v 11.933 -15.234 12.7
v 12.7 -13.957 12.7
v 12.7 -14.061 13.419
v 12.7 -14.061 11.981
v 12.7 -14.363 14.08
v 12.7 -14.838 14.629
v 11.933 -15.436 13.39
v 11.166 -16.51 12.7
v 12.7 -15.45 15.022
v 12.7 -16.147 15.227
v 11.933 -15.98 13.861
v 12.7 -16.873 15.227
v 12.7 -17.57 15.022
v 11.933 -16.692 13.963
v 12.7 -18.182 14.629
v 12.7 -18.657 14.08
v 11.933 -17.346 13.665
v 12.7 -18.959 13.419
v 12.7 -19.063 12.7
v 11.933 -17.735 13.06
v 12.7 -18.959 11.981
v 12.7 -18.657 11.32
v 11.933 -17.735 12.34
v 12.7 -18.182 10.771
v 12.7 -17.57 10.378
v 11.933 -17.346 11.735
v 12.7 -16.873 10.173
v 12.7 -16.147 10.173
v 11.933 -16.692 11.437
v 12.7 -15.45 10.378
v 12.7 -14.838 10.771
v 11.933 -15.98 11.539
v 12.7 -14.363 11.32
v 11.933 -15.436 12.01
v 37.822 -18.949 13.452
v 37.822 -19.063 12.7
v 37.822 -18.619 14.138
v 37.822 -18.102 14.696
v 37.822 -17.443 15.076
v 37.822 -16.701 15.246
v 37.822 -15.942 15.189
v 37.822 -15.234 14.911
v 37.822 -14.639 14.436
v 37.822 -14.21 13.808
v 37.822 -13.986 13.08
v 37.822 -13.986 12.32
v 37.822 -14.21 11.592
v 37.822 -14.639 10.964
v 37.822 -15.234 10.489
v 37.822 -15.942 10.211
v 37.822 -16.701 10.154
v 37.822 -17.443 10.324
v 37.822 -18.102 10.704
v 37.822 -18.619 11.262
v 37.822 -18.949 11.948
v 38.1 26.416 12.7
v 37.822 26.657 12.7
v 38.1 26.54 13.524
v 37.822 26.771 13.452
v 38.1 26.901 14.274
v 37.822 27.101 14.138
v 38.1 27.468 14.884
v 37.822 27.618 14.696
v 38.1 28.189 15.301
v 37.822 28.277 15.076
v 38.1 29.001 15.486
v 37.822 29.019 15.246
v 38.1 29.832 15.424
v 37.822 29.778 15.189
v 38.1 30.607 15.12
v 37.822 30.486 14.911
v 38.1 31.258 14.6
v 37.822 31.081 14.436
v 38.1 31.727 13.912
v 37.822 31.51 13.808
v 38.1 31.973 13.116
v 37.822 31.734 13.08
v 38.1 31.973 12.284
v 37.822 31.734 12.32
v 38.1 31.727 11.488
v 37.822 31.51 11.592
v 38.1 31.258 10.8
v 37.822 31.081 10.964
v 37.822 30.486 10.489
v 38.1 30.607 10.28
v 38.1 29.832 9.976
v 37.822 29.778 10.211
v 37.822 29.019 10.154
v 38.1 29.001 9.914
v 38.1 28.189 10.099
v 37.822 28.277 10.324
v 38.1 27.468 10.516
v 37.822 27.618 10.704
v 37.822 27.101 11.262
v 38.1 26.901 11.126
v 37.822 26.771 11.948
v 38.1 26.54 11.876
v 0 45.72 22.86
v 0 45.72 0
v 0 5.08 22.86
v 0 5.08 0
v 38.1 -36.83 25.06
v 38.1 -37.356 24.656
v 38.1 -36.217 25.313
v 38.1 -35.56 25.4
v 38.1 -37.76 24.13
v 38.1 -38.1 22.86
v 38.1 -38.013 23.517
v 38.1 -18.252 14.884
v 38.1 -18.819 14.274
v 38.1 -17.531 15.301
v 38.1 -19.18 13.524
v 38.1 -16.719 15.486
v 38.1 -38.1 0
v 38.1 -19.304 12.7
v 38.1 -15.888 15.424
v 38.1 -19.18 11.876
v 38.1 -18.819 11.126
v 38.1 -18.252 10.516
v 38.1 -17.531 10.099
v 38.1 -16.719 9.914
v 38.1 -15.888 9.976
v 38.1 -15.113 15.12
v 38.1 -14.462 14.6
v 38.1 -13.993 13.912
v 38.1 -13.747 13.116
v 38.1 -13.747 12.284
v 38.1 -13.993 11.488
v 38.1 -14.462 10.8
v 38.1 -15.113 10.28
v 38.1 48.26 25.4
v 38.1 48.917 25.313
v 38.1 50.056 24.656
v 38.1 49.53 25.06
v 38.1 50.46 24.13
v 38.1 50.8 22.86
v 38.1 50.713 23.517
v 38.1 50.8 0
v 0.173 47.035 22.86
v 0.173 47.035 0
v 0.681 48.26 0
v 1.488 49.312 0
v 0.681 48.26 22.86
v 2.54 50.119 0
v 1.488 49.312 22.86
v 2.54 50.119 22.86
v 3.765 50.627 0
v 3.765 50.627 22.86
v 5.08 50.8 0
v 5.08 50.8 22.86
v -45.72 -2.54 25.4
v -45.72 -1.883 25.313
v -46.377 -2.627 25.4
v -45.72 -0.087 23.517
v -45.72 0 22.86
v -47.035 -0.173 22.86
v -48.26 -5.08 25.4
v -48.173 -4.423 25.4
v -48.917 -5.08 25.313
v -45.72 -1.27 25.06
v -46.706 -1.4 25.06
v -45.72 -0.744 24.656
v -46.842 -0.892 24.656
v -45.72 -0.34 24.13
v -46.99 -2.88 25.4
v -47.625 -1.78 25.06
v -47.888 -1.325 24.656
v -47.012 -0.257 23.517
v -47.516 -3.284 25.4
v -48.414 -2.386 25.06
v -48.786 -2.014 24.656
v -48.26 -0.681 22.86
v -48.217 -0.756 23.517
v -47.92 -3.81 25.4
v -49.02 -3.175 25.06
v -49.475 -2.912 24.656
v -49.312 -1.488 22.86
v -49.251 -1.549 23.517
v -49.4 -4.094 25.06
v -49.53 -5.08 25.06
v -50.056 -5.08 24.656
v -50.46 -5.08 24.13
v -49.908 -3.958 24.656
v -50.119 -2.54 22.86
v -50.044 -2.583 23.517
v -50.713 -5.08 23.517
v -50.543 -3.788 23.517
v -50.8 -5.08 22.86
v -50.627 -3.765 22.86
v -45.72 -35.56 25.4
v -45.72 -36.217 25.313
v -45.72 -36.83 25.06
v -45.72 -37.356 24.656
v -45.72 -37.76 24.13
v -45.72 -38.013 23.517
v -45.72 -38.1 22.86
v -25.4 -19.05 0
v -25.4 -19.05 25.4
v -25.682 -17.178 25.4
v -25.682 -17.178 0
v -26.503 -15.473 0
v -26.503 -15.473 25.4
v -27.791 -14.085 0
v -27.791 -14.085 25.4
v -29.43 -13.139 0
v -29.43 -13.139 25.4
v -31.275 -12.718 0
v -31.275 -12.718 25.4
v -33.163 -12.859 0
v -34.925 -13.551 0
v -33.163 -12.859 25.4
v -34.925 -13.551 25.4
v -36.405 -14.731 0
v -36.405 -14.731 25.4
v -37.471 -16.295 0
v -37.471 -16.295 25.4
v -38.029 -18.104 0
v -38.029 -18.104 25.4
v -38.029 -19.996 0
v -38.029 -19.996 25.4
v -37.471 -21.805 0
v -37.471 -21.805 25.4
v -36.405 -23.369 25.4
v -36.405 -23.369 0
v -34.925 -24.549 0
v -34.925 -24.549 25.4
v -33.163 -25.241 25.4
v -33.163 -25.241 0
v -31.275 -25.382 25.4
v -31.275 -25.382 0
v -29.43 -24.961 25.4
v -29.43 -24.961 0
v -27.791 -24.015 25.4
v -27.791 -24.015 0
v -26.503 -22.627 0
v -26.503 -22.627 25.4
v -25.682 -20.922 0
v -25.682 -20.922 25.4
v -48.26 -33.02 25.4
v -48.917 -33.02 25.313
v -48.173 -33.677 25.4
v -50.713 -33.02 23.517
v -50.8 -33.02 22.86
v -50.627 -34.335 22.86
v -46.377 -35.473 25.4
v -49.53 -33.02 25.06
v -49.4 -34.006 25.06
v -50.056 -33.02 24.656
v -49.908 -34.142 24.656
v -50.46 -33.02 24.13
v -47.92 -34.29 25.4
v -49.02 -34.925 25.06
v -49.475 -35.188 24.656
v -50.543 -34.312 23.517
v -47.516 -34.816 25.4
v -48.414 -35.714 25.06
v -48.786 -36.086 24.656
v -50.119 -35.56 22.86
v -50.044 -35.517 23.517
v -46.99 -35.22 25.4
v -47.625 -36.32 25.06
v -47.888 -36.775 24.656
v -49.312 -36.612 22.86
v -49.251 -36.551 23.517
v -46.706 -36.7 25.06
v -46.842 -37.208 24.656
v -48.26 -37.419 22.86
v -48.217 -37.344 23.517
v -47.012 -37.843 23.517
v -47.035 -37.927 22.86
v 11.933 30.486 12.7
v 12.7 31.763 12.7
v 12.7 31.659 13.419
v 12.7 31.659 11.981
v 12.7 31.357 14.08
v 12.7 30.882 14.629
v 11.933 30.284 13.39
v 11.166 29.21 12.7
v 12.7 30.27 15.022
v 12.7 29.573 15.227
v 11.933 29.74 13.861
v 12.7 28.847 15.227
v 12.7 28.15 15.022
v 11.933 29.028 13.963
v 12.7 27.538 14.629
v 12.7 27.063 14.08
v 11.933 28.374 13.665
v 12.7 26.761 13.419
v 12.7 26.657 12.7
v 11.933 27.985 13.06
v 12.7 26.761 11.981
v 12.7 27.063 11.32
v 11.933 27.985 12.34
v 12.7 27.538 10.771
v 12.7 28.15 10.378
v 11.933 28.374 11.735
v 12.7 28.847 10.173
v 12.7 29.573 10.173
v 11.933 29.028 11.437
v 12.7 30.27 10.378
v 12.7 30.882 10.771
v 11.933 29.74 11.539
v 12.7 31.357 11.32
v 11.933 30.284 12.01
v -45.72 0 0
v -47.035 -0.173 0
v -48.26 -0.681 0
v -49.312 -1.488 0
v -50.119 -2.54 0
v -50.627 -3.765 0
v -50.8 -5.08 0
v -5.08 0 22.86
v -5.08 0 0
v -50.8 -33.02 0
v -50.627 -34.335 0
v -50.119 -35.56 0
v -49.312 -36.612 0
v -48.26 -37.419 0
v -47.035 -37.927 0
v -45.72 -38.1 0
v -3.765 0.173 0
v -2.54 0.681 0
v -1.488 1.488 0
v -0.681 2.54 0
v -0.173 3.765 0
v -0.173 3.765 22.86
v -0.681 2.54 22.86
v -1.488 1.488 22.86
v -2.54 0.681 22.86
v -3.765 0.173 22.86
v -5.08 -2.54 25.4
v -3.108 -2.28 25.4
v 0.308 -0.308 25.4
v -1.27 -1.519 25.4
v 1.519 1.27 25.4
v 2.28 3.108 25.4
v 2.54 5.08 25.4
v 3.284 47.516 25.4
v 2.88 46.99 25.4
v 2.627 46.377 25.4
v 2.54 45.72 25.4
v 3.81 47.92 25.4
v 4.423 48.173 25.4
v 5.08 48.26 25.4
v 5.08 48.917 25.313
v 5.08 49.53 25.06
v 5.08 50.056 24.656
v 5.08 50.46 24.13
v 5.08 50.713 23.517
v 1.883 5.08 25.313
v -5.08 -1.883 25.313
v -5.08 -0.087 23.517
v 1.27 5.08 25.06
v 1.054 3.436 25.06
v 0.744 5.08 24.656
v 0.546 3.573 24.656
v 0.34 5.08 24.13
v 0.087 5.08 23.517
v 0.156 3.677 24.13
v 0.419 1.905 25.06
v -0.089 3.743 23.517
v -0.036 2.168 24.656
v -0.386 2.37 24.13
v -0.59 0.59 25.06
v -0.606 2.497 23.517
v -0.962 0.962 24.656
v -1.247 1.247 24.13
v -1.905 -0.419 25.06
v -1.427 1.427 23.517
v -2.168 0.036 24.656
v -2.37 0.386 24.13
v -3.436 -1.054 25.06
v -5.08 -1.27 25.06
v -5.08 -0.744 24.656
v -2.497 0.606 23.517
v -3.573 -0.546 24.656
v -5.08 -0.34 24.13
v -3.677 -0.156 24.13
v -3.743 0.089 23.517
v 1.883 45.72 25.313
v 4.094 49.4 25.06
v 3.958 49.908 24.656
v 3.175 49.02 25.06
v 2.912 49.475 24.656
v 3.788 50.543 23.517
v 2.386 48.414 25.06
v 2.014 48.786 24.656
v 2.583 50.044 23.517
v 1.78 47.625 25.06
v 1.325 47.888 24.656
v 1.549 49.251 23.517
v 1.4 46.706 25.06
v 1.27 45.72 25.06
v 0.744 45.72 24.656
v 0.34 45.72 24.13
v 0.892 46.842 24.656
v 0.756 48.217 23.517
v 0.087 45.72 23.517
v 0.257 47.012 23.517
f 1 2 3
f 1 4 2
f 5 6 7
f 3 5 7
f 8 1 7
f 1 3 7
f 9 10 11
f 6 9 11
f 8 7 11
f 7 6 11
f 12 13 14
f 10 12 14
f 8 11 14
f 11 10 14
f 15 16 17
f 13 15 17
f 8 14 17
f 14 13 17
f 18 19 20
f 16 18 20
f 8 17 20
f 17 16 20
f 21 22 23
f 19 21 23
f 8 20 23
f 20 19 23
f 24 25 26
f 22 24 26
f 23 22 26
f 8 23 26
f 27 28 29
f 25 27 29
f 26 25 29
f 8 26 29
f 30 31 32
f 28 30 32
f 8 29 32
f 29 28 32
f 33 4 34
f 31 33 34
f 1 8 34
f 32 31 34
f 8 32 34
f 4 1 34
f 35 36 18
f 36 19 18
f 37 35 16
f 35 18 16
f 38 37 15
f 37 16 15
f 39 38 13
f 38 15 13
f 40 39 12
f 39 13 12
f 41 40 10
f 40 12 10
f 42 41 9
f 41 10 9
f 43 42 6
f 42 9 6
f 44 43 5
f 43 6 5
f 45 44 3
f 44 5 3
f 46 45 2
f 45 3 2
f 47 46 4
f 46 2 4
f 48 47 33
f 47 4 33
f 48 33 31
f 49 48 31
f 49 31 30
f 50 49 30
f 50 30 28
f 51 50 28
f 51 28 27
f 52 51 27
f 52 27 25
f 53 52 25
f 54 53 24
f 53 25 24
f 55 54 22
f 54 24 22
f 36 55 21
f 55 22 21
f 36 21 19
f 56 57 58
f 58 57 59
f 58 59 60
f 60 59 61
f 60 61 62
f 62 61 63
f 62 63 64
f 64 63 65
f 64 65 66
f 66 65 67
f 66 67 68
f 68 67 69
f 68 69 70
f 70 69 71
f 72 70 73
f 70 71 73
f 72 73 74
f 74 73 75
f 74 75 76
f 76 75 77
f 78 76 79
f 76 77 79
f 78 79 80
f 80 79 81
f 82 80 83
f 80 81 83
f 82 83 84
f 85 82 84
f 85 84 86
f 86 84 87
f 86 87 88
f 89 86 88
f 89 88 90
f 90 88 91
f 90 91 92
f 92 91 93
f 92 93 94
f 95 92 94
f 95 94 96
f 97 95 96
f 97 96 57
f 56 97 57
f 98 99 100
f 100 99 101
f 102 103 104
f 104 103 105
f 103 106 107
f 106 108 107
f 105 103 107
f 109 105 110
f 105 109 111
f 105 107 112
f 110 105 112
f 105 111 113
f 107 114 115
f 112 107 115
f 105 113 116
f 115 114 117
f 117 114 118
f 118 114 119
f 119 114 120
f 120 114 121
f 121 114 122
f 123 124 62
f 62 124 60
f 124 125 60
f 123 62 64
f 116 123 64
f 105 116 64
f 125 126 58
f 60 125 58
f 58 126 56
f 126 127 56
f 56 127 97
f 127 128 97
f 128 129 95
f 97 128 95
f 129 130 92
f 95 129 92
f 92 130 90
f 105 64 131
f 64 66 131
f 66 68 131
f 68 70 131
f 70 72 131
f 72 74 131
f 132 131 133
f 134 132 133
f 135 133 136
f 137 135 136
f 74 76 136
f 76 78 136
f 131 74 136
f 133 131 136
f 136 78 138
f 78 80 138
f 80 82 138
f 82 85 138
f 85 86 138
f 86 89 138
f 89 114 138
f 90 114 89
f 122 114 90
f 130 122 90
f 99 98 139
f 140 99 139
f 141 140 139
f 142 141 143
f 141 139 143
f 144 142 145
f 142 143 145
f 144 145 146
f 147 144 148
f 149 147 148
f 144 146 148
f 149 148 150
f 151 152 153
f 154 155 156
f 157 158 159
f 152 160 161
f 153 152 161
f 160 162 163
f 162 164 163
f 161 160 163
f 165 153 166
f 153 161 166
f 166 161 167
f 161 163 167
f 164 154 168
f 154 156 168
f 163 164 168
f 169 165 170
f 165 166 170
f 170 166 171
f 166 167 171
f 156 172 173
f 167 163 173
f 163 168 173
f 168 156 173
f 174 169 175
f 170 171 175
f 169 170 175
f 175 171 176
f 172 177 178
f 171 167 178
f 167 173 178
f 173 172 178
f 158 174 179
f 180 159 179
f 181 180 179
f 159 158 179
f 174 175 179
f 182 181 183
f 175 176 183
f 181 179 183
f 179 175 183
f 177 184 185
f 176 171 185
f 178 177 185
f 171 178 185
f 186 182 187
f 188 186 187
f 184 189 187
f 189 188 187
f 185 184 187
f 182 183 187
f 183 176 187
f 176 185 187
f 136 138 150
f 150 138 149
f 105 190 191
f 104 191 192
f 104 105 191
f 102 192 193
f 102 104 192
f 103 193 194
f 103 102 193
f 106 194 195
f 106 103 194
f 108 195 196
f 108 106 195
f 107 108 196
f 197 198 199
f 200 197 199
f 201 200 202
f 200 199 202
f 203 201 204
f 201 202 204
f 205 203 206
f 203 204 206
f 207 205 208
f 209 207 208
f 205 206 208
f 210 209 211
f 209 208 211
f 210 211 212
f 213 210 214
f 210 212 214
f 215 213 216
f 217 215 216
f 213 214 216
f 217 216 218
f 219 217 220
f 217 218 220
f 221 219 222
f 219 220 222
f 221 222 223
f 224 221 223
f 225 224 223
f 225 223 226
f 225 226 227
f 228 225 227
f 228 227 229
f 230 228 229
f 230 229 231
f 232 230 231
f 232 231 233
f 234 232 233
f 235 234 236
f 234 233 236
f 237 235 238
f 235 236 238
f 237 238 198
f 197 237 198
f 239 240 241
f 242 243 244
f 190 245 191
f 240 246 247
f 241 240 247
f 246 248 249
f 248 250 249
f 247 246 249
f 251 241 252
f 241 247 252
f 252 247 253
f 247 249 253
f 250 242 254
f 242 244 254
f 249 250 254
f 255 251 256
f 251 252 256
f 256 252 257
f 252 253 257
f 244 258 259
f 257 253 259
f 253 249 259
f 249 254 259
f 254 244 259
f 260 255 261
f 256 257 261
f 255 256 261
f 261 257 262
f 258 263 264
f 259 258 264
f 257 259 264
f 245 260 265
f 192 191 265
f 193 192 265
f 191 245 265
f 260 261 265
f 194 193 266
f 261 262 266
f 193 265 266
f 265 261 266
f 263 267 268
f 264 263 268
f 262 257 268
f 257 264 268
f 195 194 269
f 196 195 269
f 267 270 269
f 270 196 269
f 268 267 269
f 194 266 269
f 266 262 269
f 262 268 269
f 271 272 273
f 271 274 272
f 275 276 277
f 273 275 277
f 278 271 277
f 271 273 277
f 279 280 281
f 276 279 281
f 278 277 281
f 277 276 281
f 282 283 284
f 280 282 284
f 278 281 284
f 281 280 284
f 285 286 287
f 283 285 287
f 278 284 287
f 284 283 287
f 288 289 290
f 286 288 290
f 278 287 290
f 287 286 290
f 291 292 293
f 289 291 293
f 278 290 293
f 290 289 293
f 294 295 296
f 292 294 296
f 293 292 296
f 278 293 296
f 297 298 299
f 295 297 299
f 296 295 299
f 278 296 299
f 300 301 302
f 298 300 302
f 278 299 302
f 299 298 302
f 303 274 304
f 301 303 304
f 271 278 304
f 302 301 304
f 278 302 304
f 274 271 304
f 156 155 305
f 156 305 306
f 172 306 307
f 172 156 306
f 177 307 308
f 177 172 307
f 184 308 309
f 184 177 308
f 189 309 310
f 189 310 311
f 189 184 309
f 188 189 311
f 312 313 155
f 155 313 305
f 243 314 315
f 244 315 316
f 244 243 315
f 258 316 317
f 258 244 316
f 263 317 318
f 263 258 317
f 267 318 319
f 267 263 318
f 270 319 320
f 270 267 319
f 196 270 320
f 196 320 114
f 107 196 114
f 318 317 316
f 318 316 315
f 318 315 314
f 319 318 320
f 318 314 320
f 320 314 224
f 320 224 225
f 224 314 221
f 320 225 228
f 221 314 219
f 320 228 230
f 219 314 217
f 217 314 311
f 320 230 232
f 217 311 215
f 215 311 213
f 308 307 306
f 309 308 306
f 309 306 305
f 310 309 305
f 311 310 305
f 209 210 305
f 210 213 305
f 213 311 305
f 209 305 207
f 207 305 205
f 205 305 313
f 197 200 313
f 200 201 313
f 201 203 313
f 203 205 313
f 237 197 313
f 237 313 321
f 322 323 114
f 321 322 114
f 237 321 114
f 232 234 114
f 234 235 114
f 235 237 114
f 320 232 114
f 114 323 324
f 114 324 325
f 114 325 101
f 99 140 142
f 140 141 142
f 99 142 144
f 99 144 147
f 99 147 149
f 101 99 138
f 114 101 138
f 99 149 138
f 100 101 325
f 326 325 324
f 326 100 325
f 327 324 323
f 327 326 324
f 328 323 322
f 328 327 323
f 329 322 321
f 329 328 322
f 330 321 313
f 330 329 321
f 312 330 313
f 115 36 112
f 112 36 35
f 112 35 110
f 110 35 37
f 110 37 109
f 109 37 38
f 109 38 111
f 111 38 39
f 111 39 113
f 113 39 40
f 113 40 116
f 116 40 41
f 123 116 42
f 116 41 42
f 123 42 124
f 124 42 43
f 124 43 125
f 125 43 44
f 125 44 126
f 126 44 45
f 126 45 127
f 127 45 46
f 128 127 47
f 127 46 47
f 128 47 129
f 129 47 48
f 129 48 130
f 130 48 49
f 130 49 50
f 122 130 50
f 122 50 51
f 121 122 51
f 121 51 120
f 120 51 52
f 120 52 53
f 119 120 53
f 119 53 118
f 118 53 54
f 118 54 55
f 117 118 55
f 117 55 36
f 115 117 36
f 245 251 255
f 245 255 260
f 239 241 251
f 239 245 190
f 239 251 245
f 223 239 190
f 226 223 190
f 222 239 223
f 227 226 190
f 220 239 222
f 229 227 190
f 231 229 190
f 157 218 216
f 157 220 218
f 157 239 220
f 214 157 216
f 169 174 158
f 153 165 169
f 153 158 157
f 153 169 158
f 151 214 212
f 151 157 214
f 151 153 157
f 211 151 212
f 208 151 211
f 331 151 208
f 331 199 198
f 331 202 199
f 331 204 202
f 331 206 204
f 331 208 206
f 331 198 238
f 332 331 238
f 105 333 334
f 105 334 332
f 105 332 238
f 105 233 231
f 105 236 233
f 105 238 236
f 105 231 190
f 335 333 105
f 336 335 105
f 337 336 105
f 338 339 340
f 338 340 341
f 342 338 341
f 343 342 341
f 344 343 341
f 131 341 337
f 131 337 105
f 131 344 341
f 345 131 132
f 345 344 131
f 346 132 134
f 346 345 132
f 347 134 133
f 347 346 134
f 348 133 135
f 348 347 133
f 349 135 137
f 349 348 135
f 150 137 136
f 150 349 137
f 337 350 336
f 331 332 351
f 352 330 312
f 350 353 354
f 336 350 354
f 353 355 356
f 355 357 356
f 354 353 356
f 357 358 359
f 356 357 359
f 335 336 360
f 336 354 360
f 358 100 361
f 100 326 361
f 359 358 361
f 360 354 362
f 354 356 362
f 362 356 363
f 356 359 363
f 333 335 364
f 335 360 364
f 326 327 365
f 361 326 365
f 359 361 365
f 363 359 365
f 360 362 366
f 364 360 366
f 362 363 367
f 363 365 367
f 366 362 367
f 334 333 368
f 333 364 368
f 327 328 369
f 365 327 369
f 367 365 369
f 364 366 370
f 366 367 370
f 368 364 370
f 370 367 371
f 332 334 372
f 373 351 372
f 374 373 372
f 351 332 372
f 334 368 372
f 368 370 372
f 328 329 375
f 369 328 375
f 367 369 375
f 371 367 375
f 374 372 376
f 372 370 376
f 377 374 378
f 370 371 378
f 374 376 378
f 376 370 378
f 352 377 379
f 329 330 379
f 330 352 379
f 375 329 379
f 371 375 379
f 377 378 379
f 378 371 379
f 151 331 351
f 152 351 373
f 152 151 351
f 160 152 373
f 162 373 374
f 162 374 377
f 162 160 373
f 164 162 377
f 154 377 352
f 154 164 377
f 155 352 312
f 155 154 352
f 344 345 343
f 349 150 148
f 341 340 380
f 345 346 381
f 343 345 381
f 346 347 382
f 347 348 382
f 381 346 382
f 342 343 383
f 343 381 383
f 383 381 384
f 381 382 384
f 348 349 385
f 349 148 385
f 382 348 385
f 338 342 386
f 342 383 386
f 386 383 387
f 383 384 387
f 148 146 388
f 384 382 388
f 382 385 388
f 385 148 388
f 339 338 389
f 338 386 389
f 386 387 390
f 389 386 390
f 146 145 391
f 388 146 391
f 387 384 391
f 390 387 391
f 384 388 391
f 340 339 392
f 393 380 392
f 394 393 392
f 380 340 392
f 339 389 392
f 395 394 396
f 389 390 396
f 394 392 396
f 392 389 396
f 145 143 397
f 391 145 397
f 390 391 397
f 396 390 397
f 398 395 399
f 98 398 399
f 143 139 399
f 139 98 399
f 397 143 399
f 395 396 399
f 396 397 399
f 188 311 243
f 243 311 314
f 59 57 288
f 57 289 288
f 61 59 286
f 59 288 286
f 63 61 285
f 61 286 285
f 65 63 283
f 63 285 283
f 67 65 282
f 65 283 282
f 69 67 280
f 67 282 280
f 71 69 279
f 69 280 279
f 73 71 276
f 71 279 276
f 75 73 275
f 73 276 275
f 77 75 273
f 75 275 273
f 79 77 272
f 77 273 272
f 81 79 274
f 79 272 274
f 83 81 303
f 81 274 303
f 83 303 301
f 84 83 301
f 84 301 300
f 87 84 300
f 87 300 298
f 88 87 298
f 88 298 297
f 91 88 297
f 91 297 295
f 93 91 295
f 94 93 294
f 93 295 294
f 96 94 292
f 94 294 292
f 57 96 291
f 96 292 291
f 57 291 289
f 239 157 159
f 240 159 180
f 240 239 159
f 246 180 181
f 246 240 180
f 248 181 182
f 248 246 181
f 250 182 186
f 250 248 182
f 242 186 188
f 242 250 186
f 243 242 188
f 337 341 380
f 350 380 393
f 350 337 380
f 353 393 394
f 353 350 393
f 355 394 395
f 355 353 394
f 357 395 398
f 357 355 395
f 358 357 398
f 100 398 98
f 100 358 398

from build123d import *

# Parameters (mm, degrees)
F1_DEPTH       = 25.4
F2_R           = 6.35
F3_DEPTH       = 25.4
F4_R           = 5.08
F5_R           = 2.54
F7_D           = 5.1054
F7_DEPTH       = 25.4
F7_CSINK_D     = 5.588
F7_CSINK_ANGLE = 82
F7_TIP         = 1.5338169022


with BuildPart() as f1:
    # F0 (on Top) → F1 (new body)
    with BuildSketch(Plane.XY):
        Polygon((0, 50.8), (0, 0), (-50.8, 0), (-50.8, -38.1), (38.1, -38.1), (38.1, 50.8), align=None)
    extrude(amount=F1_DEPTH)

    # F2 (on face) → F3 (cut, through all)
    with BuildSketch(Plane.XY.offset(25.4)):
        with Locations((-31.75, -19.05)):
            Circle(F2_R)
    extrude(amount=-F3_DEPTH, mode=Mode.SUBTRACT)

    # F4
    f4_edges = [f1.edges().sort_by_distance(p)[0] for p in [
        (-50.8, -38.1, 12.7),
        (-50.8, 0, 12.7),
        (0, 0, 12.7),
        (0, 50.8, 12.7),
    ]]
    fillet(f4_edges, radius=F4_R)

    # F5
    f5_edges = [f1.edges().sort_by_distance(p)[0] for p in [
        (-3.81, -38.1, 25.4),
    ]]
    fillet(f5_edges, radius=F5_R)

    # F7
    with Locations(Plane.YZ.offset(38.1)):
        with Locations((29.21, 12.7), (-16.51, 12.7)):
            CounterSinkHole(F7_D / 2, F7_CSINK_D / 2, depth=F7_DEPTH, counter_sink_angle=F7_CSINK_ANGLE)
            with Locations((0, 0, -(F7_DEPTH + F7_TIP / 2))):  # 118° drill point
                Cone(0, F7_D / 2, F7_TIP, mode=Mode.SUBTRACT)


solid = f1.part
